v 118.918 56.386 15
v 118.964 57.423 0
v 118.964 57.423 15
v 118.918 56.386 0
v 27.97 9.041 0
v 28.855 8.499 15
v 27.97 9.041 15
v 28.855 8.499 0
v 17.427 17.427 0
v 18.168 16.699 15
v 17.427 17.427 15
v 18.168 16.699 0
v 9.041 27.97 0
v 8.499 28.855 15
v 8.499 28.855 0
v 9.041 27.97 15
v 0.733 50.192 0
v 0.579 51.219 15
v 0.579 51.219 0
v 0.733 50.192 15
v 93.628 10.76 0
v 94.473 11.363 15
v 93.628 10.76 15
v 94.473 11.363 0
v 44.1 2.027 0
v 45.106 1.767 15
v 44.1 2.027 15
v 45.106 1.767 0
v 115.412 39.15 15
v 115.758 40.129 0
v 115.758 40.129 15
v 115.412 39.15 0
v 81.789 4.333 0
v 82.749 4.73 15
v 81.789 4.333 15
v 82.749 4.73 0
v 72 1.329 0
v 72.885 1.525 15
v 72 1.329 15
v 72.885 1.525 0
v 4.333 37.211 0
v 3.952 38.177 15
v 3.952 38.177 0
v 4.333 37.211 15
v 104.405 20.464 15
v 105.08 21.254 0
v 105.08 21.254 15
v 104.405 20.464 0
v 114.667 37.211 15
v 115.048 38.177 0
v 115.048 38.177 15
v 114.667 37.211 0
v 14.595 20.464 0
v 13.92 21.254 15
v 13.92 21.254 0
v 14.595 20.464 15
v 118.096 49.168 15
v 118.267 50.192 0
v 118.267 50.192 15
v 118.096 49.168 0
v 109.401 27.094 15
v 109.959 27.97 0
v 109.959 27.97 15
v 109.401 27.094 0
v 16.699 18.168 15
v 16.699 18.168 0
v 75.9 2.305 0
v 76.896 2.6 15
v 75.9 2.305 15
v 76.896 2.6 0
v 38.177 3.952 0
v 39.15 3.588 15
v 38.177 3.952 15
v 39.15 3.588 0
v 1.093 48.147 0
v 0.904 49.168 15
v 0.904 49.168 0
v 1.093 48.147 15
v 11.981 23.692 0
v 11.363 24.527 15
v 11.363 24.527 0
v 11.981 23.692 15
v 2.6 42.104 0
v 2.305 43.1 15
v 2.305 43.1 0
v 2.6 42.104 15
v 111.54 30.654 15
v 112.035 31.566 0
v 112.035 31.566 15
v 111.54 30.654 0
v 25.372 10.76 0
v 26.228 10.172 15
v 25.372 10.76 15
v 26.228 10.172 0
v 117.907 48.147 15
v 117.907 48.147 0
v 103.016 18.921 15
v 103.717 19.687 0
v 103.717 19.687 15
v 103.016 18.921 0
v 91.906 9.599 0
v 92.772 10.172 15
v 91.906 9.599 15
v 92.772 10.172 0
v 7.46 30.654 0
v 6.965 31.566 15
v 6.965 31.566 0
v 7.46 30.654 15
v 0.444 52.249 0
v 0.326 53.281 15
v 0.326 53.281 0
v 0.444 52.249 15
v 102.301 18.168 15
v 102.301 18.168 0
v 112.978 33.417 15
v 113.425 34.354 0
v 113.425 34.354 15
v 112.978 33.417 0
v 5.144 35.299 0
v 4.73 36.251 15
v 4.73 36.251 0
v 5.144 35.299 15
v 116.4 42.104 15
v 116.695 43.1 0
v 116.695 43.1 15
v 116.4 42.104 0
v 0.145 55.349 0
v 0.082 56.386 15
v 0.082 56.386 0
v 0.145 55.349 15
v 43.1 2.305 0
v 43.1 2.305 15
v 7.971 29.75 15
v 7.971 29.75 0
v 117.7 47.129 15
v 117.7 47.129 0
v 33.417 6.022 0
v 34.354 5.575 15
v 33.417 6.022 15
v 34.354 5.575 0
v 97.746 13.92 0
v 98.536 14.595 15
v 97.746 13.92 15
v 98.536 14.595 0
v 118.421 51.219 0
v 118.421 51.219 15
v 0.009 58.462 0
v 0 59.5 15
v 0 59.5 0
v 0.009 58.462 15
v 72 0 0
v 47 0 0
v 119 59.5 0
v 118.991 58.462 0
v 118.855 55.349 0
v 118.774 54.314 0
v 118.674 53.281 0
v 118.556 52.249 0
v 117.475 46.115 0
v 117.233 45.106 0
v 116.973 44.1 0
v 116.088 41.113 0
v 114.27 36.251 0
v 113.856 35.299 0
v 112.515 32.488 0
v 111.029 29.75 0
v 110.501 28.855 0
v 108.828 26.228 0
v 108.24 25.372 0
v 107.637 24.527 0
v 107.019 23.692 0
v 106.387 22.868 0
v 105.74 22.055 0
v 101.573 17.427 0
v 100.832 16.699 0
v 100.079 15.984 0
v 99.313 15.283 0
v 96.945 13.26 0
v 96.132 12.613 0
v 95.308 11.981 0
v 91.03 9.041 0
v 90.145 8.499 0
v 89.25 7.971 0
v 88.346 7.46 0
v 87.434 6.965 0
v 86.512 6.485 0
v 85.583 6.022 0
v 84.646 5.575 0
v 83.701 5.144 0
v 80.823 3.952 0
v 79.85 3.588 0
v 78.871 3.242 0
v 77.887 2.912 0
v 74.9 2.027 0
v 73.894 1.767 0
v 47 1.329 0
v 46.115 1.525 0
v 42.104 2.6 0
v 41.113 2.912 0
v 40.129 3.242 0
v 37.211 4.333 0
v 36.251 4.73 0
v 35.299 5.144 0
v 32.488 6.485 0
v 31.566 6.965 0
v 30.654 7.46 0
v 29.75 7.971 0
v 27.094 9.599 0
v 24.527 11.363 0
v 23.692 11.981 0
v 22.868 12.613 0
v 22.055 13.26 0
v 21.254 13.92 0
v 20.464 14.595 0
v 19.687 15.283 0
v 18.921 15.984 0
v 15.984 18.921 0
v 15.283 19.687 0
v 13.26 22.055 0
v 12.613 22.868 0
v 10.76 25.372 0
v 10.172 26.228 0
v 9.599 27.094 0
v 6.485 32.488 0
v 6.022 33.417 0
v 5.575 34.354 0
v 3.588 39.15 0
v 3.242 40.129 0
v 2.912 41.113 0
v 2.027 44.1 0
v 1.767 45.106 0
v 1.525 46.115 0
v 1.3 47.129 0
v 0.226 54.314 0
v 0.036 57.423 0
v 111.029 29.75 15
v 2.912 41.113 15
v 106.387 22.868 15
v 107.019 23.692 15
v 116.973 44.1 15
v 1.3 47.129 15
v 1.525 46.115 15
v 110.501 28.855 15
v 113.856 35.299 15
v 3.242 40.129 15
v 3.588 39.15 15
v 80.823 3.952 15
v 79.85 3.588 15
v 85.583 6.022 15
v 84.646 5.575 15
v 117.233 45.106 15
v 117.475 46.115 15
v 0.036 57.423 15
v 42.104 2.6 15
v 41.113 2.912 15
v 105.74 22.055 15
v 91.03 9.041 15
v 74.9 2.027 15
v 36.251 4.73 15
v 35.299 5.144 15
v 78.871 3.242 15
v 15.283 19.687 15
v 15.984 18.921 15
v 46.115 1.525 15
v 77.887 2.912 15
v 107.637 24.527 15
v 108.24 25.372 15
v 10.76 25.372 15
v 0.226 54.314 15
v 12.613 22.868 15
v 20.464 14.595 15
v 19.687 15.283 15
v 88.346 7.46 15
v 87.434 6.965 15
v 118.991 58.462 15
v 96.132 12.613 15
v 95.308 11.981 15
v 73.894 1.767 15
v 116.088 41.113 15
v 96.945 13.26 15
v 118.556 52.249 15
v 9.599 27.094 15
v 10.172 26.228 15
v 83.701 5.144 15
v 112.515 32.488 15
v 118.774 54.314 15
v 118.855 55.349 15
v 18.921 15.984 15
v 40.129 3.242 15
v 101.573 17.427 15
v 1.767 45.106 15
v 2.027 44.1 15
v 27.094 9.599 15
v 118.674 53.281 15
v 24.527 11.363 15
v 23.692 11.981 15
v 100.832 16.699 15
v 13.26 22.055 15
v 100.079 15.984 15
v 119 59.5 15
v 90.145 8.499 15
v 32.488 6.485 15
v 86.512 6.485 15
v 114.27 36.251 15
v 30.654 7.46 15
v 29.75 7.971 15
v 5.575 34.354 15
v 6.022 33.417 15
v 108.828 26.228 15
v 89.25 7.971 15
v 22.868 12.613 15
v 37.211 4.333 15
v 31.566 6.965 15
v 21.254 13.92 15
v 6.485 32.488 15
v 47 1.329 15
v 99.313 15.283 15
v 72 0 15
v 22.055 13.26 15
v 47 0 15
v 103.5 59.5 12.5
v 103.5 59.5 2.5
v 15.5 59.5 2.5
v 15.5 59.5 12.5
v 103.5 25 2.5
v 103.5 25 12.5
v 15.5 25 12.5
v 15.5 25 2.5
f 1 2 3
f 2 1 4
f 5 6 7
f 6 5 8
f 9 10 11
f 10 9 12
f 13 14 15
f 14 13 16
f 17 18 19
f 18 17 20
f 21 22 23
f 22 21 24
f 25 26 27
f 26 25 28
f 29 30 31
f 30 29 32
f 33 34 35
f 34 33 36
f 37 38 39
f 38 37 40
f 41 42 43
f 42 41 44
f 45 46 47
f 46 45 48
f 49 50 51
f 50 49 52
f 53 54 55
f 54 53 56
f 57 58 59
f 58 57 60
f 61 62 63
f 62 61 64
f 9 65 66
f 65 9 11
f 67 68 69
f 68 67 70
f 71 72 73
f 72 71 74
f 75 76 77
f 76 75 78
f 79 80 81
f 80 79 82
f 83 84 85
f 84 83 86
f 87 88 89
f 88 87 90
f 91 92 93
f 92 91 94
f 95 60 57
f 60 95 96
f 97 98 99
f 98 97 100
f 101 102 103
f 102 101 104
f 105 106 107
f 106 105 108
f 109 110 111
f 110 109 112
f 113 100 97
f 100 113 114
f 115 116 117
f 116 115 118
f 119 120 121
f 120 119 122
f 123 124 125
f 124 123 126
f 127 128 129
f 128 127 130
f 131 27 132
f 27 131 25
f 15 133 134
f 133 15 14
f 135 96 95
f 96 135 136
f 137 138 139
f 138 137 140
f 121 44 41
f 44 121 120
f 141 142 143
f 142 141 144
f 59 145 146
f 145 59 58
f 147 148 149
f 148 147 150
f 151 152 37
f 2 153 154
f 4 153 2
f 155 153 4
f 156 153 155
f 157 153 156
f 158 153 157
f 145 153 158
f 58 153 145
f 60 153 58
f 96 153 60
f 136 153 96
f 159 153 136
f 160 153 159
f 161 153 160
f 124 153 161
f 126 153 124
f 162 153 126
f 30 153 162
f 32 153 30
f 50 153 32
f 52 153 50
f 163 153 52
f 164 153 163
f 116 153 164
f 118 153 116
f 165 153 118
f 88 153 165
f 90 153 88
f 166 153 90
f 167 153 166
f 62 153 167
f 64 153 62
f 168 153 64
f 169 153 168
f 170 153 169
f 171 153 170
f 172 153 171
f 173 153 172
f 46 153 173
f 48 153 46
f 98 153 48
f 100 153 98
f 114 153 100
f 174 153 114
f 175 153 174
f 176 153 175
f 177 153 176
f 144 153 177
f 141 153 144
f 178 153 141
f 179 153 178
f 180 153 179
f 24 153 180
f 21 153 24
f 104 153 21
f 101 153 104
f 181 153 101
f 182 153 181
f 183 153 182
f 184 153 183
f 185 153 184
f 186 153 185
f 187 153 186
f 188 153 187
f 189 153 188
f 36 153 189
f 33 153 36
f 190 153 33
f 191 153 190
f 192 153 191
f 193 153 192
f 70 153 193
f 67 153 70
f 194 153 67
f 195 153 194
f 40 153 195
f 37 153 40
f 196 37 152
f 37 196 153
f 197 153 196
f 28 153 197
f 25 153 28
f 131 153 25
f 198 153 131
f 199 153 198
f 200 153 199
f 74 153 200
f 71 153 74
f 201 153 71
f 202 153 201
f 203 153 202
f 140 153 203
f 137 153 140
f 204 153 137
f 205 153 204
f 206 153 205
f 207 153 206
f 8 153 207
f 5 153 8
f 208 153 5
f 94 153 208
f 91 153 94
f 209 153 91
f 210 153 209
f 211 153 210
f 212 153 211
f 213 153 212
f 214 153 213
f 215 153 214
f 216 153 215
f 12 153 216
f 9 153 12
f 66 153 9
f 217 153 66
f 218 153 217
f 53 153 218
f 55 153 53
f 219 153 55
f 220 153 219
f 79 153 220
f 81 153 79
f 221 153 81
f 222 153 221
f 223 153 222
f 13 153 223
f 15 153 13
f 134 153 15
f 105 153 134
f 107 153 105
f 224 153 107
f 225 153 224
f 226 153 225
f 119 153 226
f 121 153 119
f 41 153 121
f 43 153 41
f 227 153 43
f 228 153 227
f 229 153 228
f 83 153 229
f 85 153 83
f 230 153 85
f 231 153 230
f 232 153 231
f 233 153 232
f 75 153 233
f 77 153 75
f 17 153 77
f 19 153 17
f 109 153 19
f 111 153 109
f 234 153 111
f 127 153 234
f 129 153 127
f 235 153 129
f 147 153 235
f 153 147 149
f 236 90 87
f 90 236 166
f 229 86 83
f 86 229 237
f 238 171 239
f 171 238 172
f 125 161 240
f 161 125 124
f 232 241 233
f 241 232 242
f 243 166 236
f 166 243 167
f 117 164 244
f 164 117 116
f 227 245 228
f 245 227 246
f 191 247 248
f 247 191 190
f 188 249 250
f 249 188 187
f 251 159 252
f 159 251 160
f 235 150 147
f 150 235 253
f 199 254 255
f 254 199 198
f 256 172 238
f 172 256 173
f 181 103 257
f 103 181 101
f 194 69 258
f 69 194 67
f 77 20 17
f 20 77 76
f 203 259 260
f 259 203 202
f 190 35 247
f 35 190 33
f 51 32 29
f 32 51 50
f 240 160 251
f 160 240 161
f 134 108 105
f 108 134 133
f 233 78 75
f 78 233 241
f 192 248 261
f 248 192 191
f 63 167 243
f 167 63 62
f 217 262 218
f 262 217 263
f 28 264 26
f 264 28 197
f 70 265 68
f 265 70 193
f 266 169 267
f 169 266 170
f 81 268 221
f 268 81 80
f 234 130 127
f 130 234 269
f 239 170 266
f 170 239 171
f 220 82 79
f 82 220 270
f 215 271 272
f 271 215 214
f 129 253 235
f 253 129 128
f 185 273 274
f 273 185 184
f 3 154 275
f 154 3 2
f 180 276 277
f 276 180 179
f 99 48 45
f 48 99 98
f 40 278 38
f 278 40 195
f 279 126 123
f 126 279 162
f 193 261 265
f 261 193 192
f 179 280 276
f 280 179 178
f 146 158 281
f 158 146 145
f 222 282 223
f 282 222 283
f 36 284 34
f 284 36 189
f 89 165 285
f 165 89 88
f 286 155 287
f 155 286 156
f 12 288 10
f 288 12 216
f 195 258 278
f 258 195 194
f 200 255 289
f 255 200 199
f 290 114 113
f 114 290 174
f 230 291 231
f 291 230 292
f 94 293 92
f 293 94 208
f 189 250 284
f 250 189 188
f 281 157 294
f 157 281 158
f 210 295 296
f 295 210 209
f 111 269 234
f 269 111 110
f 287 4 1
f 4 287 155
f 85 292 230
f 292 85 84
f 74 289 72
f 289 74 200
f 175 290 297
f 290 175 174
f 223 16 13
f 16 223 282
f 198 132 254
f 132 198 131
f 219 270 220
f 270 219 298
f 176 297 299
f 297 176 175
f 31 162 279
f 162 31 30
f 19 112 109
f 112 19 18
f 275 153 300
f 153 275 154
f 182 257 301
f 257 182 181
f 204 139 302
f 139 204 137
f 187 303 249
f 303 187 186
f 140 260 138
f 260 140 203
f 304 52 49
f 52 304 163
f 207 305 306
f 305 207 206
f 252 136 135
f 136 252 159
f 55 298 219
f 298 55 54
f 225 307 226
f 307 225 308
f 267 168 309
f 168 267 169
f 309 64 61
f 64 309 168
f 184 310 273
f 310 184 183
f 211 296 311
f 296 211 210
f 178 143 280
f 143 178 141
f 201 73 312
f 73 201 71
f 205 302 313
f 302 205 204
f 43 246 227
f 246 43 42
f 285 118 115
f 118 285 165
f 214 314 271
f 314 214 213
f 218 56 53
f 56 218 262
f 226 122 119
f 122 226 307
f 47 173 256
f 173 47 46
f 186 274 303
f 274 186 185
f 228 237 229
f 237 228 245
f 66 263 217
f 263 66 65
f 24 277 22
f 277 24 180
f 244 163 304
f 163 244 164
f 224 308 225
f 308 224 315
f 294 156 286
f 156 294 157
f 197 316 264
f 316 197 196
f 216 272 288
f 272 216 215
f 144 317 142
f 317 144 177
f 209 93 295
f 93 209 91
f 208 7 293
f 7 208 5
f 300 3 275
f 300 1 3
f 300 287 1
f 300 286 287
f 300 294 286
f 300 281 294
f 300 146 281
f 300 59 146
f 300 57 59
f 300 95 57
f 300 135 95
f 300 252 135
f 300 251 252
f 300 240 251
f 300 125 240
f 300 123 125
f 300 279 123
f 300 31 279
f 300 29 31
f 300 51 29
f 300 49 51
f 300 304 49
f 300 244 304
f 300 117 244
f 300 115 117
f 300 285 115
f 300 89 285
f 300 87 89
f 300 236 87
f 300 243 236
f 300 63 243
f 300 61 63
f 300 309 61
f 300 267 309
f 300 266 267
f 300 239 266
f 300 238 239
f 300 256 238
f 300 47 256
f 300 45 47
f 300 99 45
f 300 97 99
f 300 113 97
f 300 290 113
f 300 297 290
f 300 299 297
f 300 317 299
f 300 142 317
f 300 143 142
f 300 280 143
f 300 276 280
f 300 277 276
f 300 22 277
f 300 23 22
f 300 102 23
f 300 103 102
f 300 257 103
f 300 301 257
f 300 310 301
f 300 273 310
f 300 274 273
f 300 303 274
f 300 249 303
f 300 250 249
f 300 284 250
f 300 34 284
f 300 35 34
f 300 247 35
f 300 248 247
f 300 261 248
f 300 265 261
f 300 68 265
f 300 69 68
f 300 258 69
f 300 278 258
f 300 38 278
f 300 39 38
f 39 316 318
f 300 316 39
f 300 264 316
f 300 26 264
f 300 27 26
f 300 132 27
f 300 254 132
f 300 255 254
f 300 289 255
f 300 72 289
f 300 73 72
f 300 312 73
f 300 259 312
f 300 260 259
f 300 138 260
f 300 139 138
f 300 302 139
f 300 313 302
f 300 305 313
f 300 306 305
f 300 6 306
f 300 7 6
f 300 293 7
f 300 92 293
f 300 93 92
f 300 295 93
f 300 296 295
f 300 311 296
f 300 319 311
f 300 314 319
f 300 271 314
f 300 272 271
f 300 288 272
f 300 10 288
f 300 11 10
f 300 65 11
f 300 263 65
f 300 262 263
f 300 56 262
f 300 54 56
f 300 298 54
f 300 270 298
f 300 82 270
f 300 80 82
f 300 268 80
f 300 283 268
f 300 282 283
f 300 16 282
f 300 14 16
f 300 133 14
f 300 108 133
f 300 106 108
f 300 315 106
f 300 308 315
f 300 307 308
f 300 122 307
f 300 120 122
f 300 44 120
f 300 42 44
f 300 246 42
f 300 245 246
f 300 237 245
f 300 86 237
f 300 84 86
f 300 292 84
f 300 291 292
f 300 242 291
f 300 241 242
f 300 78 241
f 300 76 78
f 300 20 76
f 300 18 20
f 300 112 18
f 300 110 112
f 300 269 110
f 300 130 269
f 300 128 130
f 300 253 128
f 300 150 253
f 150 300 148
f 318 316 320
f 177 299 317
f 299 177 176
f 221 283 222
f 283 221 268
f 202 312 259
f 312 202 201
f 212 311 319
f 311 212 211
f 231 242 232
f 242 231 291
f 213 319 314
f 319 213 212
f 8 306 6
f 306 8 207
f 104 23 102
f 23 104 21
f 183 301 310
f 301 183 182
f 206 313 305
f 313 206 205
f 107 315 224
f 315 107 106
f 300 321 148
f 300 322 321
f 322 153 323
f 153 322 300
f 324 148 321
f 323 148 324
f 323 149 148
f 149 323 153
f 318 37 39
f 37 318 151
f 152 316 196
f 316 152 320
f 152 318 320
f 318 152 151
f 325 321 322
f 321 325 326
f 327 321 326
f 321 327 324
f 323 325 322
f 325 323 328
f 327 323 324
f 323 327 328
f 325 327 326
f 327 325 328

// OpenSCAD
/*
Maze measurements

Card size: 56x87mm

    - Base game: 
        - Roles: 2mm
        - Rules: 2.35mm
        - Characters: 5mm
        - Cards: 24mm
    - Dogde City: 
        - Roles: 2.4mm
        - Characters: 4.4mm
        - Cards: 11.7mm
    - Por un puñado de cartas: 
        - Cards: 4.4mm
    - Solo ante el peligro: 
        - Cards: 3.9mm
    - El valle de las sombras: 
        - Cards: 8mm
    - Extra cards:
        - Cards: 1mm

Ball measurements:
    Width: 100mm
    Height: 210mm
*/

$fa = 1;
$fs = 0.4;

card_high = 88;
card_width = 56;

cylynder_radius = 59.5;

difference() {
    // Base insert
    union()  {
        difference() {
            // Main cylynder
            translate([cylynder_radius, cylynder_radius, 0])
                cylinder(r=cylynder_radius, h=15);
            // Half cylynder removal
            translate([-0.5, cylynder_radius, -0.5])
                cube([cylynder_radius * 2.01, cylynder_radius + 1, 16]);
        }

        // Base of the cube
        translate([cylynder_radius - 25 / 2, 0, 0])
            cube([25, 15, 15]);
    }

    // Test maze
    translate([(cylynder_radius * 2 - card_high) / 2, 25, 2.5])
        cube(size=[card_high, card_width, 10]);
}
